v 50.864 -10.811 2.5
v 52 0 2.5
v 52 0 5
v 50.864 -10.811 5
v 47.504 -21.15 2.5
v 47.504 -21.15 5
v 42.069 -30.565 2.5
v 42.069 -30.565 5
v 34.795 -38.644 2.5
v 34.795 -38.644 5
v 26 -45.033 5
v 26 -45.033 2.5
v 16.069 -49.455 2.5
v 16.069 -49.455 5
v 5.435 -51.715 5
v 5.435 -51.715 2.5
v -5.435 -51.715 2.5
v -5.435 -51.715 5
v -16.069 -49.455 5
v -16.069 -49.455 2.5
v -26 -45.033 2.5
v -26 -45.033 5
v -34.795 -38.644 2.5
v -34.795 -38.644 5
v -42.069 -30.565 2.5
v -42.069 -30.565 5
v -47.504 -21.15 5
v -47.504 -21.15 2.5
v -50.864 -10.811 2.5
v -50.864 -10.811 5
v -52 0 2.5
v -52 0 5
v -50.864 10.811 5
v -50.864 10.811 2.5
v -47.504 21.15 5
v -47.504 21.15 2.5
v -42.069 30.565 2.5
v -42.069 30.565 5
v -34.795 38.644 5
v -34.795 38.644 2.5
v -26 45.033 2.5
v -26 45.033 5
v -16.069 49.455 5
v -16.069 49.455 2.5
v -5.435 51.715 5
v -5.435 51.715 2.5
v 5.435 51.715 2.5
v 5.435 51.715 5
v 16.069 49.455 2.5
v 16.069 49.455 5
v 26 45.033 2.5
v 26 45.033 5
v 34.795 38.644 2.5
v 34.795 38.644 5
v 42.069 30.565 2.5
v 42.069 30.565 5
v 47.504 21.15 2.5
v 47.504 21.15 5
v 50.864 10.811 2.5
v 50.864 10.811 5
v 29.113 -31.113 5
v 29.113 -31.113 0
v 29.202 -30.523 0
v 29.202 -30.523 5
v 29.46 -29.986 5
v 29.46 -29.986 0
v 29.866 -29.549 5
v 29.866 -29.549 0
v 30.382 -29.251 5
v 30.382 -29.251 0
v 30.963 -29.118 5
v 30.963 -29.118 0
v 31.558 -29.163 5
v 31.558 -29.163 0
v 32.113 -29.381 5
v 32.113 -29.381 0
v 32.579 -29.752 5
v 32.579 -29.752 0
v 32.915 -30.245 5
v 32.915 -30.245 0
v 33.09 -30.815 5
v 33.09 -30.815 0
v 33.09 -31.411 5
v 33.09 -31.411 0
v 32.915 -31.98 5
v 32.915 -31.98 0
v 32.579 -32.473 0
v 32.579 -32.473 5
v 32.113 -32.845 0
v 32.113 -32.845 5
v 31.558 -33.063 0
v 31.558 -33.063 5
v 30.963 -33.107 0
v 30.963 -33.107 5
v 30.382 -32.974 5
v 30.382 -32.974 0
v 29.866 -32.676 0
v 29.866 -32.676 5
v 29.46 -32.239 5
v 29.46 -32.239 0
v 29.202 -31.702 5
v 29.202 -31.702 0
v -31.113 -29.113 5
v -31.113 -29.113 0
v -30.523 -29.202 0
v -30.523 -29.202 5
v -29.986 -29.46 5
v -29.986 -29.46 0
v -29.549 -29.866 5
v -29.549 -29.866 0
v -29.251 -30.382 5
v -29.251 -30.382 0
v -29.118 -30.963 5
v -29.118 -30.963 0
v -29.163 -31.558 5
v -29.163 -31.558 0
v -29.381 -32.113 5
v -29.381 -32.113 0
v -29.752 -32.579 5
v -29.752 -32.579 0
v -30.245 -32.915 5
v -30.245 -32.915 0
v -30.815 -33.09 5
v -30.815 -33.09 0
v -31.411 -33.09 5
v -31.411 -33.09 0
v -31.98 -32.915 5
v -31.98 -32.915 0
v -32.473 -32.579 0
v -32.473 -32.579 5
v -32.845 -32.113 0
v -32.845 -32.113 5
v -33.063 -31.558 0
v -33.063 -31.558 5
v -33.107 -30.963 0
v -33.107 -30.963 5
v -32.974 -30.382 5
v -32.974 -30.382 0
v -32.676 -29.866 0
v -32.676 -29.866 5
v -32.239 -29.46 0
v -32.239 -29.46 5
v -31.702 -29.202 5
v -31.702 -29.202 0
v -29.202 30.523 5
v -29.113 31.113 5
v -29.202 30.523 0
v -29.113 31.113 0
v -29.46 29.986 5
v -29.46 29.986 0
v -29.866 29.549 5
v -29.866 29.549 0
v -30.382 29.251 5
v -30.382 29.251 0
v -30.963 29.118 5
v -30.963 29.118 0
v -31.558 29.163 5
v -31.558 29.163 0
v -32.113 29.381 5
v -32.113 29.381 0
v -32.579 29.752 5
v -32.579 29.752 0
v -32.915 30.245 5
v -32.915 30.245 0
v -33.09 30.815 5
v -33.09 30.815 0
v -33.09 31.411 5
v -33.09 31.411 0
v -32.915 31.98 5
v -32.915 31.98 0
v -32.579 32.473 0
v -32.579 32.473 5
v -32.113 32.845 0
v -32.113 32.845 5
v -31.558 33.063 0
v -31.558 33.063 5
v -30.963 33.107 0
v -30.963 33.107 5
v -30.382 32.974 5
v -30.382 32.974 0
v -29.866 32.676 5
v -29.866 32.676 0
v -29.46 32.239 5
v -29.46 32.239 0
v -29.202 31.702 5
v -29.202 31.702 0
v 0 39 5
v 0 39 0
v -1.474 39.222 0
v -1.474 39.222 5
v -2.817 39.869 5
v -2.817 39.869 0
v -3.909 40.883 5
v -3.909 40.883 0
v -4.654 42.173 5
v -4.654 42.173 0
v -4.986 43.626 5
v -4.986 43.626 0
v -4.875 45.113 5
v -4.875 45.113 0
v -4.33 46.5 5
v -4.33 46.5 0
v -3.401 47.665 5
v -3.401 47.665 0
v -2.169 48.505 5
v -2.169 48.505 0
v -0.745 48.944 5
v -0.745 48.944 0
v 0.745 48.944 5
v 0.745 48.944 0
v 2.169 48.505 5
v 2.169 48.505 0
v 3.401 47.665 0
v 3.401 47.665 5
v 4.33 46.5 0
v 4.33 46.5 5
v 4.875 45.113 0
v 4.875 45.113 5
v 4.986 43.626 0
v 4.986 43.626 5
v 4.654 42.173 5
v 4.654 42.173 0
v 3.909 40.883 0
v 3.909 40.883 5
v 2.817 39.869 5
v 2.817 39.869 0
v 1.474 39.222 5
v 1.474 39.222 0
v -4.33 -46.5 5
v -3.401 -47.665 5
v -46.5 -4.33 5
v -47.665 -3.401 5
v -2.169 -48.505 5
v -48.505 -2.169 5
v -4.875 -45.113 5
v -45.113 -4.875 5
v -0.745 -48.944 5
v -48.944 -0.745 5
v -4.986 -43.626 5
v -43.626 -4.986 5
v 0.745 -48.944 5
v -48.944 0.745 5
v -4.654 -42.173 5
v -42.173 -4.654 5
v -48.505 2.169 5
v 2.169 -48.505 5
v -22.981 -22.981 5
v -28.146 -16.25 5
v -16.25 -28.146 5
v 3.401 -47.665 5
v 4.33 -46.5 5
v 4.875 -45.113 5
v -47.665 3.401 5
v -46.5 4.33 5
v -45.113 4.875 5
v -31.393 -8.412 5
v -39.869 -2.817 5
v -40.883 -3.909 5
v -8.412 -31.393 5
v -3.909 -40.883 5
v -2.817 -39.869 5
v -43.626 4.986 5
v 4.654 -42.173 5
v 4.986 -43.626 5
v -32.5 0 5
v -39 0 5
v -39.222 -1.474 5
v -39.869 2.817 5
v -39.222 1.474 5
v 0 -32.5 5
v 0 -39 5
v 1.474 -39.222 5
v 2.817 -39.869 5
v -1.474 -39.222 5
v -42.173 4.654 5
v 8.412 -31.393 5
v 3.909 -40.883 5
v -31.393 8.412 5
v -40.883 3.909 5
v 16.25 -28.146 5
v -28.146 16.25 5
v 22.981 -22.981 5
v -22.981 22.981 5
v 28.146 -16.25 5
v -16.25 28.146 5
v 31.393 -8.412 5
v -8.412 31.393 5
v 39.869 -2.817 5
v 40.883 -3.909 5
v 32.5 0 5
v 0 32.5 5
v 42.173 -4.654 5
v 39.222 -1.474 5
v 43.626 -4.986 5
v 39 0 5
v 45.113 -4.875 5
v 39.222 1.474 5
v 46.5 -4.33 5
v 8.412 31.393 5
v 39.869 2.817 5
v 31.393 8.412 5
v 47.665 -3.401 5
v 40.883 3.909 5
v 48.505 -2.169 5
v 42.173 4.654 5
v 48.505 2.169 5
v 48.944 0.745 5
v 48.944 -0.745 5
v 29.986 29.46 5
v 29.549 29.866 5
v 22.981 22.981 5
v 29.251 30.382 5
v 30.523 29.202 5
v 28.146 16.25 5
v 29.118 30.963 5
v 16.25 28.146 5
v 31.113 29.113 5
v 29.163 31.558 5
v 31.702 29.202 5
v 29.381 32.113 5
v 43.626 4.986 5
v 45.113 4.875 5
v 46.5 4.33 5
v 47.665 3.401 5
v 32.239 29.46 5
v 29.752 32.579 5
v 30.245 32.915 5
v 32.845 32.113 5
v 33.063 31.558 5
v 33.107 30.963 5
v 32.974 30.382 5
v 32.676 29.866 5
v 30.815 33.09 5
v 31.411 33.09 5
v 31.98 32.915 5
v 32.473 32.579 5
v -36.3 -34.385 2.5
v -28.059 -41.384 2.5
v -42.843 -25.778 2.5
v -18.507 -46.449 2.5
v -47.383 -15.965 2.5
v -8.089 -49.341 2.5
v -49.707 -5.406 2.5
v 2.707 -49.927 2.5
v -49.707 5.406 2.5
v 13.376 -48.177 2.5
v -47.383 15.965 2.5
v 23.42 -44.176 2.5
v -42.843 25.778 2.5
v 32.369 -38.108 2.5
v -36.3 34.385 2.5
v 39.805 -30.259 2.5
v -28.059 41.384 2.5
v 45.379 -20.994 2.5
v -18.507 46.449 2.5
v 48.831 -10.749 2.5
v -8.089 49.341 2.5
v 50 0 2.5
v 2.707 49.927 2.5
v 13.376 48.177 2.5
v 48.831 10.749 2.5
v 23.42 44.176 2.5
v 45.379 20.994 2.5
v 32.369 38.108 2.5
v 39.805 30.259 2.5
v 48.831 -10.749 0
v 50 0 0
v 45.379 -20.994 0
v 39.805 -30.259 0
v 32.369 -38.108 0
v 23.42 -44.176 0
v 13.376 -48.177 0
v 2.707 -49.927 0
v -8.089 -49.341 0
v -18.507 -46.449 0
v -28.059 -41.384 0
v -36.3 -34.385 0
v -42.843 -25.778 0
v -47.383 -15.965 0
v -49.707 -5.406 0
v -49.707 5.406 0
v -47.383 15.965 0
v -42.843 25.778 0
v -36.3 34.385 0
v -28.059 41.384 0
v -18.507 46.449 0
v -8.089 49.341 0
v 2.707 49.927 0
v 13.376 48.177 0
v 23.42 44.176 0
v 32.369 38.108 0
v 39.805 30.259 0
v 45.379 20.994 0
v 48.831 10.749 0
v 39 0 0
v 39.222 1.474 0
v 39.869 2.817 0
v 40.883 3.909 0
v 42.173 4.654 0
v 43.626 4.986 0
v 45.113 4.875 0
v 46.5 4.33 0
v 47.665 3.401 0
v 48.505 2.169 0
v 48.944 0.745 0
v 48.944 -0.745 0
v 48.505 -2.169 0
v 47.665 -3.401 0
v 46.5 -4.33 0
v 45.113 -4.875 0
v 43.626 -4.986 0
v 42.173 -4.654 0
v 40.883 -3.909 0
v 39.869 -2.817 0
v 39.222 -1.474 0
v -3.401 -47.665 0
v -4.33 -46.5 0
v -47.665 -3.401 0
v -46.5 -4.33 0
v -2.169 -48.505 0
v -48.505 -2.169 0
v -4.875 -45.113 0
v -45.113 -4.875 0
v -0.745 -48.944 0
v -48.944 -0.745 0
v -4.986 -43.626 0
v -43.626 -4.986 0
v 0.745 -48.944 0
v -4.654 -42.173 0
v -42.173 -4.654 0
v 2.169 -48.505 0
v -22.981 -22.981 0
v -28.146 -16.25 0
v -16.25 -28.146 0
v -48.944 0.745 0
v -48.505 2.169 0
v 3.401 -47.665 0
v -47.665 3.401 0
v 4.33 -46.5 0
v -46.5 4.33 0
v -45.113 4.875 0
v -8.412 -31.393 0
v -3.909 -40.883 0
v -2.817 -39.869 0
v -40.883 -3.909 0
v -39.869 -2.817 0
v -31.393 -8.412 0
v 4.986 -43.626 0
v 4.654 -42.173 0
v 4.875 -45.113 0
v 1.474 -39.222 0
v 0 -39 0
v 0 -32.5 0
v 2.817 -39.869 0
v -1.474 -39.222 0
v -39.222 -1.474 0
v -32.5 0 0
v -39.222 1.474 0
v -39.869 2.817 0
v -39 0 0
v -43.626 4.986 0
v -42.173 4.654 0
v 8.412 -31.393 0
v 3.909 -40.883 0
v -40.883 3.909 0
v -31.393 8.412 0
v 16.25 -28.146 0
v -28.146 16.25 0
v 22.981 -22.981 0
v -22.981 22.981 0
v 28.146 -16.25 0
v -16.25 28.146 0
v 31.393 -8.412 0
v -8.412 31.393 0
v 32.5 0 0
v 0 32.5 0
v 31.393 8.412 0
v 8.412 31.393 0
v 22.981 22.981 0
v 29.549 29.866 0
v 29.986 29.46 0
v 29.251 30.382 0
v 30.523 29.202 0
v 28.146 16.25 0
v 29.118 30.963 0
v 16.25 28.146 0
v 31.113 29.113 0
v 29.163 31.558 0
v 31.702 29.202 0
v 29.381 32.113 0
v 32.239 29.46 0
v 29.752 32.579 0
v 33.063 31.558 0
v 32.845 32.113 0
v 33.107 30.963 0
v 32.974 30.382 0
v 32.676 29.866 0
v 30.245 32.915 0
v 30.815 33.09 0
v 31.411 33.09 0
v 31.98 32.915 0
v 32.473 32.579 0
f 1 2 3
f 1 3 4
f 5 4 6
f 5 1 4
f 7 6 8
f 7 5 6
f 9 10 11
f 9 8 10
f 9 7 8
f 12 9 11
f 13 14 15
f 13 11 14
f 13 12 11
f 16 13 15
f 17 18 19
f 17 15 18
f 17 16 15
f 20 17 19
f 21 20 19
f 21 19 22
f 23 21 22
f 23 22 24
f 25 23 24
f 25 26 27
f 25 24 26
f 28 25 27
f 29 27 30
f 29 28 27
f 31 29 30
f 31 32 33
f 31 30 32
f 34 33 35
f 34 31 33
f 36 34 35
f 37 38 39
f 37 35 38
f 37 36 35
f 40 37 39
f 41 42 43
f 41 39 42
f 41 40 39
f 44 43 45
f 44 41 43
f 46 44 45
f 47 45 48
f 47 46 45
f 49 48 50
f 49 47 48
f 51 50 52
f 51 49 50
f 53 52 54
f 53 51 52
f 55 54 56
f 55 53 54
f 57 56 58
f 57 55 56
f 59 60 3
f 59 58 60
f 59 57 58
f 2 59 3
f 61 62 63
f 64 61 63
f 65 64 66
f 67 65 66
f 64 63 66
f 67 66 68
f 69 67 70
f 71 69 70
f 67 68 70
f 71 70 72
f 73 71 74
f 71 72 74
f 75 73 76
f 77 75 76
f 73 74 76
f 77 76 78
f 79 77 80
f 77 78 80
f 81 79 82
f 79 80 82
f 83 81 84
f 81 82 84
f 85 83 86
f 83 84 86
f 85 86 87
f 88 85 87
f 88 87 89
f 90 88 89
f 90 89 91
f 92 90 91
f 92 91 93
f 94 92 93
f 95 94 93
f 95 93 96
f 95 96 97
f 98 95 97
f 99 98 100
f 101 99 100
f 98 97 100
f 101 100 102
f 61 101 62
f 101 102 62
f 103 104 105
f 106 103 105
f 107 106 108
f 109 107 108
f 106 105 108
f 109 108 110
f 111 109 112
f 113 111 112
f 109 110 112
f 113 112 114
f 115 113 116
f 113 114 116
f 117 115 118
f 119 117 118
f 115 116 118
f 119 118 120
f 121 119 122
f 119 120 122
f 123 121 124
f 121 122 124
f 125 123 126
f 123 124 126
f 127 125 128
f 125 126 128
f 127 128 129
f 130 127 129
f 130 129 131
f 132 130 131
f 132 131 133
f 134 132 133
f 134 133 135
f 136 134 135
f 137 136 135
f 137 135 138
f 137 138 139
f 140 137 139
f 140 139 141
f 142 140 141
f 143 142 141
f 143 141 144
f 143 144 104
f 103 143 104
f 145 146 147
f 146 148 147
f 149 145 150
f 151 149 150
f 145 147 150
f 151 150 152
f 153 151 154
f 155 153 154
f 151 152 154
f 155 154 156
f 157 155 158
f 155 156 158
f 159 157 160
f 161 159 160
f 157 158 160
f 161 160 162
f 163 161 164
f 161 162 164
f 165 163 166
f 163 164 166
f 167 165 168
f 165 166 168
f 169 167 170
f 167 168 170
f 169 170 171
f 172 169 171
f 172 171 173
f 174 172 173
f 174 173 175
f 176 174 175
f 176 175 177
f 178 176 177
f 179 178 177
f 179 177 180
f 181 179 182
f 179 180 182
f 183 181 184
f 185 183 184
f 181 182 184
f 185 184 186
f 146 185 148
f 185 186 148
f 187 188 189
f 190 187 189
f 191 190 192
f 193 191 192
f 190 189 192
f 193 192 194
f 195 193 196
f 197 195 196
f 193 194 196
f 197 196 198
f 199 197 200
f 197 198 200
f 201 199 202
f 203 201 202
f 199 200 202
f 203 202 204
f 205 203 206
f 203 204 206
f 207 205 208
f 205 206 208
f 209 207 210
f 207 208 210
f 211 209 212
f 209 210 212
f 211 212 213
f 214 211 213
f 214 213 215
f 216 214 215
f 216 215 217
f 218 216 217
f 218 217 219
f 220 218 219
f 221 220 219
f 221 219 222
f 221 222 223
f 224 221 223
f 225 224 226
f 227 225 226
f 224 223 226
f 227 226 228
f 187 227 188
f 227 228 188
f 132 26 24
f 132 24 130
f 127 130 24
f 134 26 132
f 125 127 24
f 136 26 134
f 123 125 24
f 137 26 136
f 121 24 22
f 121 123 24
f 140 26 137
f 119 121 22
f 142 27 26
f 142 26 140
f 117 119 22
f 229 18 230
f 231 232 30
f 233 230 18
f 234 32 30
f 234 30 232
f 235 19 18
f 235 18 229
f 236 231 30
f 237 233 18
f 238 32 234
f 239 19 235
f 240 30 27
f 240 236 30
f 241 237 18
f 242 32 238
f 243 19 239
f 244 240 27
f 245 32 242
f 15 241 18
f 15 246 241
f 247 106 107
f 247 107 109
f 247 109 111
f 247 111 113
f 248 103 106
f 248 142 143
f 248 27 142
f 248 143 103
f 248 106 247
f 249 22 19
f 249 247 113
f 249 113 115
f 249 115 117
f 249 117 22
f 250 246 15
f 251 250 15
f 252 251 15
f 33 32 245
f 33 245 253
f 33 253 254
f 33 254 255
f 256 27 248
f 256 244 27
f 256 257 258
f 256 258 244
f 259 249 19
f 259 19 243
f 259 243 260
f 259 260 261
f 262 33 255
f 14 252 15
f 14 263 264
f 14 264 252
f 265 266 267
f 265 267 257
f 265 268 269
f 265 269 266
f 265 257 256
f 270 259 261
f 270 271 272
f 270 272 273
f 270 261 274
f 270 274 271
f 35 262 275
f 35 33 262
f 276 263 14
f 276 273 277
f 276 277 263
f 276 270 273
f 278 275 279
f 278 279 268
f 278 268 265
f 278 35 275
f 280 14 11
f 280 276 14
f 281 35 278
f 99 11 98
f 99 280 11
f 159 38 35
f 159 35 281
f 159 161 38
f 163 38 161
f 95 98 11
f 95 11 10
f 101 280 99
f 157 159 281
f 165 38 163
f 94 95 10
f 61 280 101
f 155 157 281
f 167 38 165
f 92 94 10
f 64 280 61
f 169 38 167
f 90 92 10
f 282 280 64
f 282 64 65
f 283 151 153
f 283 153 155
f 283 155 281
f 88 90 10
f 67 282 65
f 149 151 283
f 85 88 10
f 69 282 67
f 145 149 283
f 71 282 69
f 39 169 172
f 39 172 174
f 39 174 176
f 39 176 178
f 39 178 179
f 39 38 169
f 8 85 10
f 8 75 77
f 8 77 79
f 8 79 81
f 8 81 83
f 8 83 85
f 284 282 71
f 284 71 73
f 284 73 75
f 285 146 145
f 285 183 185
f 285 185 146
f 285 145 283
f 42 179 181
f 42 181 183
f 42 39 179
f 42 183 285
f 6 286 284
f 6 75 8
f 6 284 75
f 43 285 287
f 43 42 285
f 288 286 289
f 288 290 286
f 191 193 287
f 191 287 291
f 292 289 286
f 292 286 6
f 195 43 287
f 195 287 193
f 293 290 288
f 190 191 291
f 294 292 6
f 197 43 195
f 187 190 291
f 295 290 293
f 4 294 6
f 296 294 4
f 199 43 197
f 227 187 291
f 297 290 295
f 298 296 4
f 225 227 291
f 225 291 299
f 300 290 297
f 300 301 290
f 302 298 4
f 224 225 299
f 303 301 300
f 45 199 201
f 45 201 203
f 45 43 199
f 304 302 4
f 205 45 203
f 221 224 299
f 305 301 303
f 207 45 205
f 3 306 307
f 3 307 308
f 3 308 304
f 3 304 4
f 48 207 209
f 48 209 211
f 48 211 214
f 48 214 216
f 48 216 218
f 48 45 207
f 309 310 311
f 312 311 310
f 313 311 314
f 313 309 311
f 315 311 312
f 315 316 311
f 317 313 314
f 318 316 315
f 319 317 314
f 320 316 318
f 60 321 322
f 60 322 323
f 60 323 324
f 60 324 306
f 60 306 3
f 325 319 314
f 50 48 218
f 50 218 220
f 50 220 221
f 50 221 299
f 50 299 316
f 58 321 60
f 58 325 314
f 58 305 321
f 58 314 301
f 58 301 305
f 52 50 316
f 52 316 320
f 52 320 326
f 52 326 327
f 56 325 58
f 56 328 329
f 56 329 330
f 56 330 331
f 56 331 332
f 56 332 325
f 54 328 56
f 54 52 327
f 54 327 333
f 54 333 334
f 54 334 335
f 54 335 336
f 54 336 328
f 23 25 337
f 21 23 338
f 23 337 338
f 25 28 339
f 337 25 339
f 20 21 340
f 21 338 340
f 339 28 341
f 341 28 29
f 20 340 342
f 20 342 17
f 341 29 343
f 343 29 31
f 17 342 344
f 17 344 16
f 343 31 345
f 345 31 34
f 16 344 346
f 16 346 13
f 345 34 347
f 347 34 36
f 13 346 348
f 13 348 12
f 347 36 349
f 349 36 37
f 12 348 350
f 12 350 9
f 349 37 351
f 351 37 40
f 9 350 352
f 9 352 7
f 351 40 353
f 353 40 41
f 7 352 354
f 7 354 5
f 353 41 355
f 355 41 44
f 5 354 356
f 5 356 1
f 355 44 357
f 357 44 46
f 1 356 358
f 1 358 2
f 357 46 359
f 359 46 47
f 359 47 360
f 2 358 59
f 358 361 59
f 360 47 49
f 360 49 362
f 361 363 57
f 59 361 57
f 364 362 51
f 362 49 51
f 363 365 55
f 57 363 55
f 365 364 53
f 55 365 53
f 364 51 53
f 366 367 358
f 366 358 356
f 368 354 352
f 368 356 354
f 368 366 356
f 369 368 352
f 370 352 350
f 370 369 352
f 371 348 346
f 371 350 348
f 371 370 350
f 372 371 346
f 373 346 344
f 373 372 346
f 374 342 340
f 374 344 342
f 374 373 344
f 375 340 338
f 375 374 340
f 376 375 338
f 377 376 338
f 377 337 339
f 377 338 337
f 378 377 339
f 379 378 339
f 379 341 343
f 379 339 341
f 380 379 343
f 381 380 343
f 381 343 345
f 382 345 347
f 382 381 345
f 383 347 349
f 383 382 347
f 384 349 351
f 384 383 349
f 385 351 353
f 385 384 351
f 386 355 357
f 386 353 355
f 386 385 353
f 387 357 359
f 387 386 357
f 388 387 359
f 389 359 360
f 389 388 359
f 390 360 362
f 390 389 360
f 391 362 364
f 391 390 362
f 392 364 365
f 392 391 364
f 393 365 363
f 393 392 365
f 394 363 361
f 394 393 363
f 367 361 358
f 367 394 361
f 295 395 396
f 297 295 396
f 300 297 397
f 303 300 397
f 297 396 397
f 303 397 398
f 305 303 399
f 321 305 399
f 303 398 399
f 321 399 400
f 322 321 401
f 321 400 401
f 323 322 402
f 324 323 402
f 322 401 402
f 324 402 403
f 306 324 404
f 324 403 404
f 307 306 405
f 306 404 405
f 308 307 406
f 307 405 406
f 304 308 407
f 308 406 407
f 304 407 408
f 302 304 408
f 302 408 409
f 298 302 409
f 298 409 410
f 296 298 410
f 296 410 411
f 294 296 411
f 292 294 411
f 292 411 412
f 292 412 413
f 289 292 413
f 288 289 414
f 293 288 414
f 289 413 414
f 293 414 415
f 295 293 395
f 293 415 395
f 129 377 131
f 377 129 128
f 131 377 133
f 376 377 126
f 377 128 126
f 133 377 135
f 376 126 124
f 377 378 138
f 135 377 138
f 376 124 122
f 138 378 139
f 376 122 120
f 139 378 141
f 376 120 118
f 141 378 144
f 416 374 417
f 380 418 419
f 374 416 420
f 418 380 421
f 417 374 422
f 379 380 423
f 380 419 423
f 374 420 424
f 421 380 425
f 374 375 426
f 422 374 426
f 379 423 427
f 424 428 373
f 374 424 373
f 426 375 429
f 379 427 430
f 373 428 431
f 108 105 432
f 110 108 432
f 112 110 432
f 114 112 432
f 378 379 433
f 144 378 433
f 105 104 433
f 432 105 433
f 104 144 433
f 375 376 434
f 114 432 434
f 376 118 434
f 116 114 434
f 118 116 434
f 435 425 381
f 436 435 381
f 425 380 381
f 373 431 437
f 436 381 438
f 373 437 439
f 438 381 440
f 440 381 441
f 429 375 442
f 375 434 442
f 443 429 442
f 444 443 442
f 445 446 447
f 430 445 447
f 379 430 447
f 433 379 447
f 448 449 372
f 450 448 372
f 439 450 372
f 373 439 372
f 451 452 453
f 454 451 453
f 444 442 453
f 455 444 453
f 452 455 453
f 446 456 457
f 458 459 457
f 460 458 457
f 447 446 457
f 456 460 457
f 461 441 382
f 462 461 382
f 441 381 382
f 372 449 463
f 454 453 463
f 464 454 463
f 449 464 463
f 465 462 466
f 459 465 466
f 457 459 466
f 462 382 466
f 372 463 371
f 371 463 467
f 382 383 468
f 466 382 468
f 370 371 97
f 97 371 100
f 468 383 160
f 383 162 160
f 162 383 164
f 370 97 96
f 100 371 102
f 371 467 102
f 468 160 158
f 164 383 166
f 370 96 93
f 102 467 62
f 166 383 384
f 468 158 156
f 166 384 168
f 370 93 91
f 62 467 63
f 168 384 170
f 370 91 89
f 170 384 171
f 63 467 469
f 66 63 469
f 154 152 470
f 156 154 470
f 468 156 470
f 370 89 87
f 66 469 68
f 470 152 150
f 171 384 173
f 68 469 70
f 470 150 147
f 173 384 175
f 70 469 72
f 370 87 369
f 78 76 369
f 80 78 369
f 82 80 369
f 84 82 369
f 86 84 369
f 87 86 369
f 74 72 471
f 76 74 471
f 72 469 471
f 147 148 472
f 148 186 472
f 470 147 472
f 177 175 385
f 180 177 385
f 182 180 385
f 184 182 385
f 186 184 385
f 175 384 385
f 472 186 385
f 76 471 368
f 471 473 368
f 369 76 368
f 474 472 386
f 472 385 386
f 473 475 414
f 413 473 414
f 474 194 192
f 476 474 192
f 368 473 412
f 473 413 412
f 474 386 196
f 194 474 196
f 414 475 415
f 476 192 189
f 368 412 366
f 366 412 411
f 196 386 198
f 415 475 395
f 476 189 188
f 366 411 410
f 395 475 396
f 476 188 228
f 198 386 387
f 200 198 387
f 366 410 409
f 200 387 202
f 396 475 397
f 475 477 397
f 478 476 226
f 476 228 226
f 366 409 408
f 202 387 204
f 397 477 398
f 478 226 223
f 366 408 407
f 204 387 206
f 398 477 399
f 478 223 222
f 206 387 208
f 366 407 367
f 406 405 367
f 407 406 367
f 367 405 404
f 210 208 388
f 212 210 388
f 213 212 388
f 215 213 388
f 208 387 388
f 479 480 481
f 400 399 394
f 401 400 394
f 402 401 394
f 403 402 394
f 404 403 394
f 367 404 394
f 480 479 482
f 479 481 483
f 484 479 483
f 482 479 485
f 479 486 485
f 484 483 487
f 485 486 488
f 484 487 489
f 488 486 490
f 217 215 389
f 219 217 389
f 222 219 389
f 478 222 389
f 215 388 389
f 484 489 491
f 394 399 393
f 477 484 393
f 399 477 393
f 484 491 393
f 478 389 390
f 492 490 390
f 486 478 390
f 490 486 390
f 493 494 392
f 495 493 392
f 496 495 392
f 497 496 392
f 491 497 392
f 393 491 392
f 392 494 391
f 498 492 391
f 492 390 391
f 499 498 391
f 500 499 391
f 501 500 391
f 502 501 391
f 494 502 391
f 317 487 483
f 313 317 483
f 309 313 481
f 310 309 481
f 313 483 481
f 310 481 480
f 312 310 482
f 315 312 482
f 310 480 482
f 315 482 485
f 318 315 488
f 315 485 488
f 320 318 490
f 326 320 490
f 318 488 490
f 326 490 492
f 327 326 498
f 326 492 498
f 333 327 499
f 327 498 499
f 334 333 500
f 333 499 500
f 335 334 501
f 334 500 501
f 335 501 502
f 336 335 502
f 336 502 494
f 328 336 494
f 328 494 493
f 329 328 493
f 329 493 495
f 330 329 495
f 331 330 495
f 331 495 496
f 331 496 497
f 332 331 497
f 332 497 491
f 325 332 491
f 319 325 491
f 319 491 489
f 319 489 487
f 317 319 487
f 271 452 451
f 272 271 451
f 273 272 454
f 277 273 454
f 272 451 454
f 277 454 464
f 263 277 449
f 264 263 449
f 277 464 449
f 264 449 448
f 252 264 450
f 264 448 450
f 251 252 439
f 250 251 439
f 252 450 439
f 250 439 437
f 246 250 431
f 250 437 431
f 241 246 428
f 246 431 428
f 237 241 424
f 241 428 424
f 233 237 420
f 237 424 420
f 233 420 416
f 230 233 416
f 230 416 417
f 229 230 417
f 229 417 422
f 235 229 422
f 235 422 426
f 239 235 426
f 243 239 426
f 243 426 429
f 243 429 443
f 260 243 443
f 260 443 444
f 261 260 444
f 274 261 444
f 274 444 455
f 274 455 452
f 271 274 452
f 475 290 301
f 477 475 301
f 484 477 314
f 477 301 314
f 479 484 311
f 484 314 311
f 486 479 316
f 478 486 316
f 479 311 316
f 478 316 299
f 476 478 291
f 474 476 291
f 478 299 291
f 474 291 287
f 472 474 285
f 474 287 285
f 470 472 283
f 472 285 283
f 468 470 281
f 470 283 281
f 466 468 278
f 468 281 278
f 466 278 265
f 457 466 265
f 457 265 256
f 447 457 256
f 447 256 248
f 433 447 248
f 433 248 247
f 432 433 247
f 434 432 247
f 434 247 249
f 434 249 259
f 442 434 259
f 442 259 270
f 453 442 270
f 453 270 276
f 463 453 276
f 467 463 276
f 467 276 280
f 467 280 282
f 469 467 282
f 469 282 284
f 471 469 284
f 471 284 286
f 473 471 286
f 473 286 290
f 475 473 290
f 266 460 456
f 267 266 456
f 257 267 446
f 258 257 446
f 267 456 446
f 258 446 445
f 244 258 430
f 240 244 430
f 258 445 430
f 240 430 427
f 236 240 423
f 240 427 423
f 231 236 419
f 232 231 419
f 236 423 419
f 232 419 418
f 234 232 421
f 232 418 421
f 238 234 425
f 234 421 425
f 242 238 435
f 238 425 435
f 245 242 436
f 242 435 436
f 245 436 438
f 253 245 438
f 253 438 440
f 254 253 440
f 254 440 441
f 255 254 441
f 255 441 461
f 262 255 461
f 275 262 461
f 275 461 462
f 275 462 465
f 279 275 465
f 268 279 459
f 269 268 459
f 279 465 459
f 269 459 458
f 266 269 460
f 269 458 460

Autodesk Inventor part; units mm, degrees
ref_plane "YZ Plane" through (0, 0, 0) normal (1, 0, 0) x (0, 1, 0)
ref_plane "XZ Plane" through (0, 0, 0) normal (0, 1, 0) x (-1, 0, 0)
ref_plane "XY Plane" through (0, 0, 0) normal (0, 0, 1) x (1, 0, 0)
sketch "スケッチ1" plane through (0, 0, 0) normal (0, 0, 1) x (1, 0, 0)
  circle A0 centre (0, 0) radius 50
  dimension "d0" = 100
extrude "押し出し1" add sketch "スケッチ1" along normal blind 2.5
sketch "スケッチ2" plane through (0, 0, 2.5) normal (0, 0, 1) x (1, 0, 0)
  circle A0 centre (0, 0) radius 52
  dimension "d3" = 104
extrude "押し出し2" add sketch "スケッチ2" along normal blind 2.5
sketch "スケッチ3" plane through (0, 0, 5) normal (0, 0, 1) x (1, 0, 0)
  point P0 (0, 0)
  point P1 (0, 44)
  dimension "d6" = 44
hole "穴1" at (0, 44, 5) direction (0, 0, -1) diameter 10 end through all
pattern_circular "円形状パターン1" count 4 over 360 about axis through (0, 0, 0) along (0, 0, 1) of "穴1"
sketch "スケッチ4" plane through (0, 0, 5) normal (0, 0, 1) x (1, 0, 0)
  circle A0 centre (0, -44) radius 5 projected
  circle A1 centre (0, 0) radius 44
  line L0 (0, 0) -> (31.1127, 31.1127)
  arc A2 (0, 3.9955) -> (0, 0) centre (1.9978, 1.9978) ccw
  line L1 (0, 3.9955) -> (0, 44)
  dimension "d17" = 45
hole "穴2" at (31.1127, 31.1127, 5) direction (0, 0, -1) diameter 4 end through all
thread "ねじ1" size "M4x0.7" class "6H" standard "ANSI Metric M Profile" full length
pattern_circular "円形状パターン2" count 4 over 360 about axis through (0, 0, 0) along (0, 0, 1) of "穴2"
sketch "スケッチ5" plane through (0, 0, 5) normal (0, 0, 1) x (1, 0, 0)
  circle A0 centre (0, 0) radius 32.5
  dimension "d30" = 65
extrude "押し出し3" cut sketch "スケッチ5" against normal through all
properties part number "出力板表" material "アルミニウム 6061"
